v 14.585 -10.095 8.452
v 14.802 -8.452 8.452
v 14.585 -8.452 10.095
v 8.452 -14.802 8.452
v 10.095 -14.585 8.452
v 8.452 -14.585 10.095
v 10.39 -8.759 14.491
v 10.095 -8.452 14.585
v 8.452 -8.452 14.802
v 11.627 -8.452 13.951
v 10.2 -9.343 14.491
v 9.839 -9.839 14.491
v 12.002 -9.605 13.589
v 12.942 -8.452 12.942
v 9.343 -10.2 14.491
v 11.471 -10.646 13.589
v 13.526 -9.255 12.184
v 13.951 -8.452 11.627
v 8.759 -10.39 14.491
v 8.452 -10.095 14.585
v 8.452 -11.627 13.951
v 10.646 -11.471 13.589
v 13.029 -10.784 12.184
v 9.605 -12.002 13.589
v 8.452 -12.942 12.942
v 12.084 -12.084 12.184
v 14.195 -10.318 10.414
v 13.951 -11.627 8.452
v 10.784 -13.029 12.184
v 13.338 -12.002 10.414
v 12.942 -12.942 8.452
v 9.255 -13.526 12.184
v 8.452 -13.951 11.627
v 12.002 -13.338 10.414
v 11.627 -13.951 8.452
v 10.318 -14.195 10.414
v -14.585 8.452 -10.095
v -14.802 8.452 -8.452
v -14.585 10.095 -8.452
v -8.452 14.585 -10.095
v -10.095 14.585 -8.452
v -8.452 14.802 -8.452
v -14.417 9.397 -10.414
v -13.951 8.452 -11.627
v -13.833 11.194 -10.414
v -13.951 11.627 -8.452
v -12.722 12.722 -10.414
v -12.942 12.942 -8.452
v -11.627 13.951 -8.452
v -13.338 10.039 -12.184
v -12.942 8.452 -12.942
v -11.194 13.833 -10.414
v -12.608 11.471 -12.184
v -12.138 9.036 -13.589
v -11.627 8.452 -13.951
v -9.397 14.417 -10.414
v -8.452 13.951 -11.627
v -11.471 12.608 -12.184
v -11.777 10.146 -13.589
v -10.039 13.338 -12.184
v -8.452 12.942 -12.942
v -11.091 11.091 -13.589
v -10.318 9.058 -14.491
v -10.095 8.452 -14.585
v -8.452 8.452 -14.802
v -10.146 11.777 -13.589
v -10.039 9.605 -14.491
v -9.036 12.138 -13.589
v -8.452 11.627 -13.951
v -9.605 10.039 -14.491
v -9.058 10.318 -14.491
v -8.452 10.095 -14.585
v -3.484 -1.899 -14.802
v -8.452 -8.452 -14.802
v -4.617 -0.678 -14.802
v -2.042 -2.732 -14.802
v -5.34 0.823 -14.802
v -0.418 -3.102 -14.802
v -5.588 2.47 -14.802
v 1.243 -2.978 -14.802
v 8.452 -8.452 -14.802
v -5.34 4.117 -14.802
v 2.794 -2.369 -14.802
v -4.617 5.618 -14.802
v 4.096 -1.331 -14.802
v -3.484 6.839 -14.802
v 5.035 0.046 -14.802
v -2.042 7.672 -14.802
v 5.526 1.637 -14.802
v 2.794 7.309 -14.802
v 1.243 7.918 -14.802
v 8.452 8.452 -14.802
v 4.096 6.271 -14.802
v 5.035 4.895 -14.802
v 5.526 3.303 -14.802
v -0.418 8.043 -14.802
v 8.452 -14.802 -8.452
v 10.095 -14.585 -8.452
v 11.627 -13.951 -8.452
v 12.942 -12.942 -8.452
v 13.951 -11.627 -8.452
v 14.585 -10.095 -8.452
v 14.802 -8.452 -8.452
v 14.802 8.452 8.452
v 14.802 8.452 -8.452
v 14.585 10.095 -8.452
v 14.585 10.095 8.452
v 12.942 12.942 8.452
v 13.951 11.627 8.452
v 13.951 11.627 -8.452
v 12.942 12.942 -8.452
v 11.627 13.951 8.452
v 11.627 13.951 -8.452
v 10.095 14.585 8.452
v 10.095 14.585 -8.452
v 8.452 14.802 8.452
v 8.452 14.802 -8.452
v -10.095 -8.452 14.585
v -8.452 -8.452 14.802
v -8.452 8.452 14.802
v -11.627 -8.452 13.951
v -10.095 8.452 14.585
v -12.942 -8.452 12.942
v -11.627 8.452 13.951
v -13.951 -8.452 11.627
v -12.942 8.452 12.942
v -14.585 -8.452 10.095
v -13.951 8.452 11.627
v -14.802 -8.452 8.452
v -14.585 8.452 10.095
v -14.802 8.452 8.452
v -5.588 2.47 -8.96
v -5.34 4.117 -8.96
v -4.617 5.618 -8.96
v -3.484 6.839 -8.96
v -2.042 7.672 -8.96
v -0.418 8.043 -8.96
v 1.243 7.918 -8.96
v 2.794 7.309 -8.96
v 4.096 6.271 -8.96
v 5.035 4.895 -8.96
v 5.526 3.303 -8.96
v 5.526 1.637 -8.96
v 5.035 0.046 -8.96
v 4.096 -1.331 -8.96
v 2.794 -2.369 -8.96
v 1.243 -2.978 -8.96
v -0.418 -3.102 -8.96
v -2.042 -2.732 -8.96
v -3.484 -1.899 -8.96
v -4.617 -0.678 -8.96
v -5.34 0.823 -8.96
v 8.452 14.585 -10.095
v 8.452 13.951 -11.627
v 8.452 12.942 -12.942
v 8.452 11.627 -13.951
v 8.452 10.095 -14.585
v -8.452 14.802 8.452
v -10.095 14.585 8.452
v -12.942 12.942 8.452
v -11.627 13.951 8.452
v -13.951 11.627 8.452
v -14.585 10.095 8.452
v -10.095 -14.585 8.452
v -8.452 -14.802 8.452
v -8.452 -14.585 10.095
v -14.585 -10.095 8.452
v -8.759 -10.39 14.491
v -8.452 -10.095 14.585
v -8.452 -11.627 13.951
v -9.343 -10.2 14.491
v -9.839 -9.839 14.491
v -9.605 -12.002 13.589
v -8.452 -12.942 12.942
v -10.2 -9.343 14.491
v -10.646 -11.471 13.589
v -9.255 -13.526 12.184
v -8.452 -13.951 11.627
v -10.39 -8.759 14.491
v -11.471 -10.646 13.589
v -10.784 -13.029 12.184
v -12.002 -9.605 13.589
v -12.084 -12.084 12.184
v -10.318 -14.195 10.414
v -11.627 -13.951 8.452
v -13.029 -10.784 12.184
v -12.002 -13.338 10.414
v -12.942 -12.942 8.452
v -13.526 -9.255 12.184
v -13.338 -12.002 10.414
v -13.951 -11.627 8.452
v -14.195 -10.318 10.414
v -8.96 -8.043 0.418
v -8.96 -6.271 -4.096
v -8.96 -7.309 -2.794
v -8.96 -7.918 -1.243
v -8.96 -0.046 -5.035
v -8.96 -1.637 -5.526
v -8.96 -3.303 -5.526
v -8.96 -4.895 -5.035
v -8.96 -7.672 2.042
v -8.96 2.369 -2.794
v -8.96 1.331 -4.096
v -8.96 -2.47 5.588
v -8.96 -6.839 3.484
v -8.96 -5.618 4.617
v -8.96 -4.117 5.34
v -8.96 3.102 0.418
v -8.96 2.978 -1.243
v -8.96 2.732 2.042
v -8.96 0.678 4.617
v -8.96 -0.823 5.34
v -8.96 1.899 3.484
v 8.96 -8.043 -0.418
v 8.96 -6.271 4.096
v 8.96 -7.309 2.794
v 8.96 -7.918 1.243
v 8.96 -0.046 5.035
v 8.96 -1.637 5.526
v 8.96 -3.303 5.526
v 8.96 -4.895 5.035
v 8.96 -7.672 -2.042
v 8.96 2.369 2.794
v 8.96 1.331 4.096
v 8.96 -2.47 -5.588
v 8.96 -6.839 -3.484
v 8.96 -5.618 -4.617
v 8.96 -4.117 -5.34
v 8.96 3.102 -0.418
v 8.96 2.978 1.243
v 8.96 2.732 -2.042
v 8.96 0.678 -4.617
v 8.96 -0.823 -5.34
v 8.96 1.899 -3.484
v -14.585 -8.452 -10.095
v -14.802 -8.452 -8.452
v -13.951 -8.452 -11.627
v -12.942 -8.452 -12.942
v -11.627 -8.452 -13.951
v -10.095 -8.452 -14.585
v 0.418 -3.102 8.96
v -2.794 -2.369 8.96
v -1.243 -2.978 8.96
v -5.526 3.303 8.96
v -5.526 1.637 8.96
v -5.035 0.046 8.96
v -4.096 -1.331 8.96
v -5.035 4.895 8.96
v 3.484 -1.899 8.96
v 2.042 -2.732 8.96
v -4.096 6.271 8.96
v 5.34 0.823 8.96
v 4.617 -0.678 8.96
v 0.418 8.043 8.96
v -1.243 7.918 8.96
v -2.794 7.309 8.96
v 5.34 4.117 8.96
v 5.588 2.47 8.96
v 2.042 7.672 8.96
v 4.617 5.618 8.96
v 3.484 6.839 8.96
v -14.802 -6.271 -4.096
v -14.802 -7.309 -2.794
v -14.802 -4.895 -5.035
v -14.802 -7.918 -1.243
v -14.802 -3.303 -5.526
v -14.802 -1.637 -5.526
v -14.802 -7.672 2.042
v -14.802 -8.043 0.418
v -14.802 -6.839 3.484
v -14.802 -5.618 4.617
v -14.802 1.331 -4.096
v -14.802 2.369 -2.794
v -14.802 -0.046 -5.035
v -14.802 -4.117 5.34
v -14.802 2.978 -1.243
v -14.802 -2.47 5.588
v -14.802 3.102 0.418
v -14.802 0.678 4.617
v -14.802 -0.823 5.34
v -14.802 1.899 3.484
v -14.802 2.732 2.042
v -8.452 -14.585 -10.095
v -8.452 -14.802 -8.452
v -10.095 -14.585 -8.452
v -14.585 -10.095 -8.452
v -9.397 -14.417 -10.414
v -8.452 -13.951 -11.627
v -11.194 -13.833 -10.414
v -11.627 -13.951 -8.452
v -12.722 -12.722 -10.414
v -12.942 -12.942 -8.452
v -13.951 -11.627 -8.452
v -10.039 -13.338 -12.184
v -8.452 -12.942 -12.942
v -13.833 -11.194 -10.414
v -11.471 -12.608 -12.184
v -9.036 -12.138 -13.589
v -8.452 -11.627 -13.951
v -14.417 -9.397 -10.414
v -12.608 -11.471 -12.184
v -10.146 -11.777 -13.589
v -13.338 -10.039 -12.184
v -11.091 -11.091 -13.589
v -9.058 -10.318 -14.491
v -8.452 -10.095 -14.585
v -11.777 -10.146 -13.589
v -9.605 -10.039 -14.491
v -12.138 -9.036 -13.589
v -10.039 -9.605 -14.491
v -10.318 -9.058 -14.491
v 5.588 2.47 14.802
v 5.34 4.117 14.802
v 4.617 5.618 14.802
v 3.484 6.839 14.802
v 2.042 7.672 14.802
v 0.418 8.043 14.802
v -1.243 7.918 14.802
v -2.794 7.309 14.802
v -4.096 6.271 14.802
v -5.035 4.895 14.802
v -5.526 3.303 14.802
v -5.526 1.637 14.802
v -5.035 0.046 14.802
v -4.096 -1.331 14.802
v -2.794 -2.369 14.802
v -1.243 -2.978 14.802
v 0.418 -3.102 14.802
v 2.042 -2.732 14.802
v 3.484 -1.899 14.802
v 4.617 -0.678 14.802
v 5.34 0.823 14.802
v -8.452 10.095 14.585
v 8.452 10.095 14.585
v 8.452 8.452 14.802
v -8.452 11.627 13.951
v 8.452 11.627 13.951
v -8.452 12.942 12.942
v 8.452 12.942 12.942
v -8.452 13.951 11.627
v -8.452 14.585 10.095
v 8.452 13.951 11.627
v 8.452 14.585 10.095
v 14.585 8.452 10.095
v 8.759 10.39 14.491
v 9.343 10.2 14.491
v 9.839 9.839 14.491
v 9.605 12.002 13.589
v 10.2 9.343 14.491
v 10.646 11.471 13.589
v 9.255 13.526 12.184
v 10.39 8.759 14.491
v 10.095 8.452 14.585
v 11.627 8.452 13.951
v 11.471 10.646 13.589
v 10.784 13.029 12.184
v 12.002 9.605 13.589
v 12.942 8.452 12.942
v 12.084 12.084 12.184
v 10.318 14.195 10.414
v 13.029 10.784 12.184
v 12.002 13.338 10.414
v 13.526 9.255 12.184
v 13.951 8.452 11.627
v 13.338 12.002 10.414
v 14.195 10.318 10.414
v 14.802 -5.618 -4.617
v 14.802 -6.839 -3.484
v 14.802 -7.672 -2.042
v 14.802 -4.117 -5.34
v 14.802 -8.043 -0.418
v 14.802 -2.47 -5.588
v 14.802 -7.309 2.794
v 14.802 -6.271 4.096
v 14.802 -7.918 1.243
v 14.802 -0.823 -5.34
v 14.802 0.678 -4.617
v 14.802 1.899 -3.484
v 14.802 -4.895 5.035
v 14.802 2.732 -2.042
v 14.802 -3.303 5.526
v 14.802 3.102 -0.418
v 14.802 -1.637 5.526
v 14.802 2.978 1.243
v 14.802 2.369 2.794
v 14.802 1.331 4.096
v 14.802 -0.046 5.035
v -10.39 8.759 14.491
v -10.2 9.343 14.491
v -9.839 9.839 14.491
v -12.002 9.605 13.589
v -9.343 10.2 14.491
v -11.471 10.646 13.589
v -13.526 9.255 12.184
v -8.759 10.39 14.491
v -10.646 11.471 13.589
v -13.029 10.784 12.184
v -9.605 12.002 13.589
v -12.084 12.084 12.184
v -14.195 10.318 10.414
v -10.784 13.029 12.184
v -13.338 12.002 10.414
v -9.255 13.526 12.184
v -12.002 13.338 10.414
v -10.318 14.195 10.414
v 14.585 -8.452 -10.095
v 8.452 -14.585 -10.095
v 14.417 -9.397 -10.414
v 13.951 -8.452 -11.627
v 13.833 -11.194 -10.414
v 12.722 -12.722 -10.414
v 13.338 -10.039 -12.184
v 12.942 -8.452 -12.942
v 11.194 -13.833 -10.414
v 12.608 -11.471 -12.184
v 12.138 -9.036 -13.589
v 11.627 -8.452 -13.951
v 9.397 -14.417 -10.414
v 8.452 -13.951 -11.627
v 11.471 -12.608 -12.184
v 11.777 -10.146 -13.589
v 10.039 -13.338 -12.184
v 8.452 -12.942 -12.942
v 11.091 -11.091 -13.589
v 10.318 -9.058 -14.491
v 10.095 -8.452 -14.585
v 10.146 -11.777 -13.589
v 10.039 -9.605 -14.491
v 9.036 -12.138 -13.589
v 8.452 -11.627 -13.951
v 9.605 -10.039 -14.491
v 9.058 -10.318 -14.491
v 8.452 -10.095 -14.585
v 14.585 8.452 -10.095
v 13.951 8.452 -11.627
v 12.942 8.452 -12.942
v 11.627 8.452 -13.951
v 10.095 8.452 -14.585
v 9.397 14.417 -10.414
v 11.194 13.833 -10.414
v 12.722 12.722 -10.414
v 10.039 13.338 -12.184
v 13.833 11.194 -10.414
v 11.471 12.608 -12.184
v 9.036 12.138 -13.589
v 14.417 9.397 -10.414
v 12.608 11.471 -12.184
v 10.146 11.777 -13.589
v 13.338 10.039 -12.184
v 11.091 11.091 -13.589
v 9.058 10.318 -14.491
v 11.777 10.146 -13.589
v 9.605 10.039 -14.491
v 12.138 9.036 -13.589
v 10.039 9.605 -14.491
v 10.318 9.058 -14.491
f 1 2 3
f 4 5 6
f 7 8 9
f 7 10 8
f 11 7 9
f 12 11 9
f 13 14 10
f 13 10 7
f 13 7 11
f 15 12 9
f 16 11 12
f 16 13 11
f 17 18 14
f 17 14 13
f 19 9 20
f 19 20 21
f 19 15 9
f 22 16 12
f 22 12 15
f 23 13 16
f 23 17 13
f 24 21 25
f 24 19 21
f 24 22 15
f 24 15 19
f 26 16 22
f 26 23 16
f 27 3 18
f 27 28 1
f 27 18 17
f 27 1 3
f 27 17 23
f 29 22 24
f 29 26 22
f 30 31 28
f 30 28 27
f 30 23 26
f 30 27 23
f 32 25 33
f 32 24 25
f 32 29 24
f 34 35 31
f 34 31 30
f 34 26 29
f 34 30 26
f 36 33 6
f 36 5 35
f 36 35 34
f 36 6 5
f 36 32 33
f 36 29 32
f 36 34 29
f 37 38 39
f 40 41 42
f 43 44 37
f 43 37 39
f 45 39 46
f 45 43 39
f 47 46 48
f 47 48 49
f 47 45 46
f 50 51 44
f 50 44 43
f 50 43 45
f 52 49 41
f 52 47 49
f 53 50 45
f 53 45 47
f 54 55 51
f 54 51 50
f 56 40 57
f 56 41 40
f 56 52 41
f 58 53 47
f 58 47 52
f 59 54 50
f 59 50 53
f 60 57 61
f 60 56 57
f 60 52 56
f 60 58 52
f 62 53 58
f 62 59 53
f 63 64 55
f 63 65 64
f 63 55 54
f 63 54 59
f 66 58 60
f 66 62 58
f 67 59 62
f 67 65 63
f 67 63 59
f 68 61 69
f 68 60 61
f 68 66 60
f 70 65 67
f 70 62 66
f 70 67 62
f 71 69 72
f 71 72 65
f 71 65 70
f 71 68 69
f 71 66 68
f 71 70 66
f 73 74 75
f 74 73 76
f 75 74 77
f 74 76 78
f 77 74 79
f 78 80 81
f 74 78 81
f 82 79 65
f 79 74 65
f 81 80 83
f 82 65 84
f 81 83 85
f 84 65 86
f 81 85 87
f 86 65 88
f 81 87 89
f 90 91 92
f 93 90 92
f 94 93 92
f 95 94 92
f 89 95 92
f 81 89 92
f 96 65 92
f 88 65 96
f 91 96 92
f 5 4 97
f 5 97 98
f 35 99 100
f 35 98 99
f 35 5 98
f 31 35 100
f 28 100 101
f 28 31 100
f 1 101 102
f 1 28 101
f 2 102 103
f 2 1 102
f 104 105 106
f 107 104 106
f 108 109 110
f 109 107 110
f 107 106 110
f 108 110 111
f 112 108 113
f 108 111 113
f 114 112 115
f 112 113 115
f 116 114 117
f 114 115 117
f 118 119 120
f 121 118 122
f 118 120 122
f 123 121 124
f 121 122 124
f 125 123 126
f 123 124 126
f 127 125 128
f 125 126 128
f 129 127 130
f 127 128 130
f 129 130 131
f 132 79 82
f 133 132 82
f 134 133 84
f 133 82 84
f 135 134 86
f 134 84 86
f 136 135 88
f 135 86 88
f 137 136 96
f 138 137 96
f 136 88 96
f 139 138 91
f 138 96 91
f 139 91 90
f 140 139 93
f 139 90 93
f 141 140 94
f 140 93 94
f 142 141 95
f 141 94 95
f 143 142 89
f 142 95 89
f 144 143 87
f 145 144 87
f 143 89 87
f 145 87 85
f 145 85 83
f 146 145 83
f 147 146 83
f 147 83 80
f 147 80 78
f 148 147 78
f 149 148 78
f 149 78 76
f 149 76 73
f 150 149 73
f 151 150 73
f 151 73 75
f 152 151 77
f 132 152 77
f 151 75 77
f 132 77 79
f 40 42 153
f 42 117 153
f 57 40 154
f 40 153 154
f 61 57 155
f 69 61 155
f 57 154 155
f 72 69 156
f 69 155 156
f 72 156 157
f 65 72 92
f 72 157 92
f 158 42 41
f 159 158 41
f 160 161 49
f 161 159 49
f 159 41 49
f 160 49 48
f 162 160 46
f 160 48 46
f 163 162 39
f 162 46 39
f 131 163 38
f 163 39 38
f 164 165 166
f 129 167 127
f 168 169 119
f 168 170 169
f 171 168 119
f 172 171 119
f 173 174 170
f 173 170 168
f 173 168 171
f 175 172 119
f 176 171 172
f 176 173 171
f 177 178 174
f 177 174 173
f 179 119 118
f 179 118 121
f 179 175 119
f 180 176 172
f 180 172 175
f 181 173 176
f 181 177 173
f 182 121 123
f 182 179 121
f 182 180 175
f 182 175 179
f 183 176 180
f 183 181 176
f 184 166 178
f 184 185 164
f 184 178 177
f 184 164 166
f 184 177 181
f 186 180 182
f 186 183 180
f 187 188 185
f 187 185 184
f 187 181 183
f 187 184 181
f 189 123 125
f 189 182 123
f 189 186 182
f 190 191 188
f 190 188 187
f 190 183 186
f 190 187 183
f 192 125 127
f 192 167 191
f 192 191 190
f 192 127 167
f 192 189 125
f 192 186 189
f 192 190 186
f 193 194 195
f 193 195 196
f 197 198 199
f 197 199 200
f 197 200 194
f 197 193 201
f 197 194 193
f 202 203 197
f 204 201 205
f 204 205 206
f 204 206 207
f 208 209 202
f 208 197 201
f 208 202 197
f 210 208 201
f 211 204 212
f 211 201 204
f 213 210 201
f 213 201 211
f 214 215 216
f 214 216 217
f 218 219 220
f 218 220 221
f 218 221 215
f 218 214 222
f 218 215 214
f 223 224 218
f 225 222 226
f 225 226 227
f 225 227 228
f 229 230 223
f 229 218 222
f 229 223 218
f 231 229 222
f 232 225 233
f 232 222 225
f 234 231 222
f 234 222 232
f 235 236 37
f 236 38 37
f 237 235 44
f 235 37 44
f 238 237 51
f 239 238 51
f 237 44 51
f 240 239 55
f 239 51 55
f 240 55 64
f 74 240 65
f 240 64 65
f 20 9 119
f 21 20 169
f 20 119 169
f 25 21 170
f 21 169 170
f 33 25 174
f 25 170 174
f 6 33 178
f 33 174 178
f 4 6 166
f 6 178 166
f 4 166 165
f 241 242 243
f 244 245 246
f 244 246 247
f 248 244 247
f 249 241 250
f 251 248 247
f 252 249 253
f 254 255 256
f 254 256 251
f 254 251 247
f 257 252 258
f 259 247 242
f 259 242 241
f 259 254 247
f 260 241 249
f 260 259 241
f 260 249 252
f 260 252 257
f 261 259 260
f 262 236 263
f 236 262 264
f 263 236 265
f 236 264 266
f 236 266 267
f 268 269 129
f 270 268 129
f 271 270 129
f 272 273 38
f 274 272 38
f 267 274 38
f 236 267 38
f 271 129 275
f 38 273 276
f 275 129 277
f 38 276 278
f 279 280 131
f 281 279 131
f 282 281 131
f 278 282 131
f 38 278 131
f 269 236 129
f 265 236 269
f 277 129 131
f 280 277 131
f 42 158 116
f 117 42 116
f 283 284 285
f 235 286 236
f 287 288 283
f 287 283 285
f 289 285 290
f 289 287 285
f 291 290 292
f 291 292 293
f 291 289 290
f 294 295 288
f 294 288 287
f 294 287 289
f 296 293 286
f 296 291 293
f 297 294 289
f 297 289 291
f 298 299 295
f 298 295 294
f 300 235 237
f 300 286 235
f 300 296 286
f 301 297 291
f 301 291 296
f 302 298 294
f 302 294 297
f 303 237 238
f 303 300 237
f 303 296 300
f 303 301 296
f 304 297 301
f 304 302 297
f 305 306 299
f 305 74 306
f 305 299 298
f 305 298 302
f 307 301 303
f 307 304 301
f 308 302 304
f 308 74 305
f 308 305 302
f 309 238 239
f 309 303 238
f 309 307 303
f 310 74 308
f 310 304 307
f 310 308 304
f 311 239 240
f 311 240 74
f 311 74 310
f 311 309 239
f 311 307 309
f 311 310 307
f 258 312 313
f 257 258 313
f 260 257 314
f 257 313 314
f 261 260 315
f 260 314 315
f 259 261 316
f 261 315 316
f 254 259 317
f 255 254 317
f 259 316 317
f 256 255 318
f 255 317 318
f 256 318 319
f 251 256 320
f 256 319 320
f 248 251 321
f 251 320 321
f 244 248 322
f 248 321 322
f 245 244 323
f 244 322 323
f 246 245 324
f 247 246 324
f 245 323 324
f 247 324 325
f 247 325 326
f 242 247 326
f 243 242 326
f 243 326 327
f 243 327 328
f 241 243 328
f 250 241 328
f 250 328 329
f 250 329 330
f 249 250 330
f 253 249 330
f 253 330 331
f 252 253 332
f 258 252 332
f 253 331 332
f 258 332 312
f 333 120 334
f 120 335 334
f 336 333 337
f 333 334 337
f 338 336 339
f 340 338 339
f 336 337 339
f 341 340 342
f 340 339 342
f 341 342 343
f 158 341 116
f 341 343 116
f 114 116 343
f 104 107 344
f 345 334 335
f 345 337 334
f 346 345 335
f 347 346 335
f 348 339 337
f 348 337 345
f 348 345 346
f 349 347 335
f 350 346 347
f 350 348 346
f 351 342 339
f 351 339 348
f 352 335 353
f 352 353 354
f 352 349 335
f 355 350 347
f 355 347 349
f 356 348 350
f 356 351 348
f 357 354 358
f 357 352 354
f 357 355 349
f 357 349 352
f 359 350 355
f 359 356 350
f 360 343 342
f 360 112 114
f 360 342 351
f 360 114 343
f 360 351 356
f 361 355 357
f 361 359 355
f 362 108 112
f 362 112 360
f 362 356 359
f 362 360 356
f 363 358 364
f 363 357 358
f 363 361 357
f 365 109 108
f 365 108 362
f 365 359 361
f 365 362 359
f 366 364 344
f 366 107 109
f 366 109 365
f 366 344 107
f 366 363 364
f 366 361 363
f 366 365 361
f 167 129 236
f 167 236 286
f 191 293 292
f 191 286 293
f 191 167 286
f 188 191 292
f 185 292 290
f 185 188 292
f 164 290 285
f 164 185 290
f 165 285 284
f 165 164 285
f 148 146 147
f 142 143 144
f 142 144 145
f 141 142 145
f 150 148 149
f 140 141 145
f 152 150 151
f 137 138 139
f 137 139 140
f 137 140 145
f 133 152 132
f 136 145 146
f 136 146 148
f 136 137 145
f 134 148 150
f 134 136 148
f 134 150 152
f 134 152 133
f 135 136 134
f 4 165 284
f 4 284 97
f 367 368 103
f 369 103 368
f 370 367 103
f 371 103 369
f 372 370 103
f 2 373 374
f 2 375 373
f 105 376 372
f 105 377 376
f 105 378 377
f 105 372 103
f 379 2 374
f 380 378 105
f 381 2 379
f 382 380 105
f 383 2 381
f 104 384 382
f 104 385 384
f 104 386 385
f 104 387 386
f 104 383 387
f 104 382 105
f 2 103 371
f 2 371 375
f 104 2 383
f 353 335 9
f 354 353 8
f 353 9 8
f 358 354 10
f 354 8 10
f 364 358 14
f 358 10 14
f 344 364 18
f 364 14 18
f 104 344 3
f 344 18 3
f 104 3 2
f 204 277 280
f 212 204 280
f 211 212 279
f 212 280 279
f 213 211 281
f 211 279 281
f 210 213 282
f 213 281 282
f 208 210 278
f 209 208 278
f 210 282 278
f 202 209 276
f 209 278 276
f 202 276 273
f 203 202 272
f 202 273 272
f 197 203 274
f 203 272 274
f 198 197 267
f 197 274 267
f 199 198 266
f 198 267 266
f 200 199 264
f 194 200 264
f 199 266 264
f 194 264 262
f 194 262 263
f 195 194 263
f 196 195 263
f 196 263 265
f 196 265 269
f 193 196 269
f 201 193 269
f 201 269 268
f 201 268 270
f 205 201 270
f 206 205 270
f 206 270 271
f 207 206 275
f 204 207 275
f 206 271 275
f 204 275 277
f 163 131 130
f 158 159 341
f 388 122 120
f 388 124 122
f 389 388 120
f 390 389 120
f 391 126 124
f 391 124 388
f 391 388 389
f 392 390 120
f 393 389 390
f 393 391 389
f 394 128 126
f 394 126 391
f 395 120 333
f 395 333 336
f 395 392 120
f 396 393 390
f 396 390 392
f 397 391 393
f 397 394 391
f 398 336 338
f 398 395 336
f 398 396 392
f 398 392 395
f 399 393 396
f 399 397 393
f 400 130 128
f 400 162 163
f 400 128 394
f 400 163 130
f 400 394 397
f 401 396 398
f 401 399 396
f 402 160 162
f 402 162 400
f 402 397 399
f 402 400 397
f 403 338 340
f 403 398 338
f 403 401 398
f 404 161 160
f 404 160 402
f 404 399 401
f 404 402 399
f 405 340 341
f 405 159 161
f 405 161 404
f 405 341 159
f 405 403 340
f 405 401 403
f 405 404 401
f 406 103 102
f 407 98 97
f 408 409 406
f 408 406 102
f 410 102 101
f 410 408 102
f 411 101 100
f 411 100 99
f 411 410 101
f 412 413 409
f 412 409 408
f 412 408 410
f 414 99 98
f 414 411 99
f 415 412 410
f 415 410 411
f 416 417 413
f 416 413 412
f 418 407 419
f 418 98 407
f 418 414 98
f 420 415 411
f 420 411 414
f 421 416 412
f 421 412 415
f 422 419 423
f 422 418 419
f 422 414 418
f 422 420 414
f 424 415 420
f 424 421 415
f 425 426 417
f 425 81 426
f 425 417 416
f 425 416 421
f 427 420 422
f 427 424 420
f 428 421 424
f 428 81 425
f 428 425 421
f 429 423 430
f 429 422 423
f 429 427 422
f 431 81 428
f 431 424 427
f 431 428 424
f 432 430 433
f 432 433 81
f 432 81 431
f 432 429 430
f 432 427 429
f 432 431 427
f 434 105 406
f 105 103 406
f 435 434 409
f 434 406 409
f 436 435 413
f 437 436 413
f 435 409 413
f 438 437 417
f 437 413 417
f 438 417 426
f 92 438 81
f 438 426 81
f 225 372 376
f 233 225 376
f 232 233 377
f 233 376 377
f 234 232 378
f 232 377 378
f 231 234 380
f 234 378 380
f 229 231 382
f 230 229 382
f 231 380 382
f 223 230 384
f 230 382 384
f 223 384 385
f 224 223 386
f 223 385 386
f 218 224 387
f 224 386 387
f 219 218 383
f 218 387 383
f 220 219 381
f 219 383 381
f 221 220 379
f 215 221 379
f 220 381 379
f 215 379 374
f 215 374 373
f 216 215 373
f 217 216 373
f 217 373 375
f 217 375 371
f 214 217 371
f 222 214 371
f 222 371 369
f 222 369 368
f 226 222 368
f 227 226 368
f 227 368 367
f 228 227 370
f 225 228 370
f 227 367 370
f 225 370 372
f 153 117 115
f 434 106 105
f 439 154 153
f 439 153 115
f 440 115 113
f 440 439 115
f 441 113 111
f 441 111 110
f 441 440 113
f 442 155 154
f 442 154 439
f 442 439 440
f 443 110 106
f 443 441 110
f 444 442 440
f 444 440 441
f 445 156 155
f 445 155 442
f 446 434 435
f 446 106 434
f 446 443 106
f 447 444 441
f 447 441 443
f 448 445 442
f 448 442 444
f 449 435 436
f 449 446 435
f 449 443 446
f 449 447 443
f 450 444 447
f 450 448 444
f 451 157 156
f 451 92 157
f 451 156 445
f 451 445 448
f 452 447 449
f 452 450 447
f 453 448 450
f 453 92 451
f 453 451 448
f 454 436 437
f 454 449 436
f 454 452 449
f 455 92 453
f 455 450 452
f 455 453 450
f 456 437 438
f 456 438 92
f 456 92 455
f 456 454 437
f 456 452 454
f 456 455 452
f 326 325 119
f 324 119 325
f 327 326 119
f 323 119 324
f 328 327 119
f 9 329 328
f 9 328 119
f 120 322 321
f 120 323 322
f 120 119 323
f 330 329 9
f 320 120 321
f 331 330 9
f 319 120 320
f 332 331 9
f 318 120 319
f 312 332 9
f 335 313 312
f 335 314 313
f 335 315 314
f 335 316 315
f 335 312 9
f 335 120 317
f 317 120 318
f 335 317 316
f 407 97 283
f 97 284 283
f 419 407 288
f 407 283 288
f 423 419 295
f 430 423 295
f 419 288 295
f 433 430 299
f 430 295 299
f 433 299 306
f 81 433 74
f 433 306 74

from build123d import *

# Parameters (mm, degrees)
BOSS_EXTRUDE1_DEPTH      = 14.80185
BOSS_EXTRUDE1_DEPTH_BACK = 14.80185
SKETCH1_W                = 29.6037
SKETCH1_H                = 29.6037
FILLET3_R                = 6.35
FILLET4_R                = 6.35
FILLET5_R                = 6.35
FILLET6_R                = 6.35
SKETCH7_R                = 5.588
CUT_EXTRUDE3_DEPTH       = 5.842
CUT_EXTRUDE4_START       = -5.842
SKETCH8_R                = 5.588
CUT_EXTRUDE4_DEPTH       = 5.842
SKETCH3_R                = 5.588
CUT_EXTRUDE5_DEPTH       = 5.842
CUT_EXTRUDE6_START       = -5.842
SKETCH9_R                = 5.588
CUT_EXTRUDE6_DEPTH       = 5.842
FILLET7_R                = 6.35
FILLET8_R                = 6.35


with BuildPart() as part:
    # Sketch1 → Boss-Extrude1 (new, two sides: drawn at the far end of the back side and taken through both)
    with BuildSketch(Plane.XY.offset(-BOSS_EXTRUDE1_DEPTH_BACK)):
        Rectangle(SKETCH1_W, SKETCH1_H)
    extrude(amount=BOSS_EXTRUDE1_DEPTH + BOSS_EXTRUDE1_DEPTH_BACK)

    # Fillet3
    fillet3_edges = [part.edges().sort_by_distance(p)[0] for p in [
        (14.80185, 14.80185, 0),
    ]]
    fillet(fillet3_edges, radius=FILLET3_R)

    # Fillet4
    fillet4_edges = [part.edges().sort_by_distance(p)[0] for p in [
        (-14.80185, 14.80185, 0),
    ]]
    fillet(fillet4_edges, radius=FILLET4_R)

    # Fillet5
    fillet5_edges = [part.edges().sort_by_distance(p)[0] for p in [
        (-14.80185, -14.80185, 0),
    ]]
    fillet(fillet5_edges, radius=FILLET5_R)

    # Fillet6
    fillet6_edges = [part.edges().sort_by_distance(p)[0] for p in [
        (14.80185, -14.80185, 0),
    ]]
    fillet(fillet6_edges, radius=FILLET6_R)

    # Sketch7 → Cut-Extrude3 (cut)
    with BuildSketch(Plane(origin=(0, 0, -14.80185), x_dir=(-1, 0, 0), z_dir=(0, 0, -1))):
        with Locations((0, 2.47015)):
            Circle(SKETCH7_R)
    extrude(amount=-CUT_EXTRUDE3_DEPTH, mode=Mode.SUBTRACT)

    # Sketch8 → Cut-Extrude4 (cut)
    with BuildSketch(Plane.XY.offset(14.80185).offset(CUT_EXTRUDE4_START)):
        with Locations((0, 2.47015)):
            Circle(SKETCH8_R)
    extrude(amount=CUT_EXTRUDE4_DEPTH, mode=Mode.SUBTRACT)

    # Sketch3 → Cut-Extrude5 (cut)
    with BuildSketch(Plane.ZY.offset(14.80185)):
        with Locations((0, -2.47015)):
            Circle(SKETCH3_R)
    extrude(amount=-CUT_EXTRUDE5_DEPTH, mode=Mode.SUBTRACT)

    # Sketch9 → Cut-Extrude6 (cut)
    with BuildSketch(Plane(origin=(14.80185, 0, 0), x_dir=(0, 0, -1), z_dir=(1, 0, 0)).offset(CUT_EXTRUDE6_START)):
        with Locations((0, -2.47015)):
            Circle(SKETCH9_R)
    extrude(amount=CUT_EXTRUDE6_DEPTH, mode=Mode.SUBTRACT)

    # Fillet7
    fillet7_edges = [part.edges().sort_by_distance(p)[0] for p in [
        (0, 14.80185, 14.80185),
    ]]
    fillet(fillet7_edges, radius=FILLET7_R)

    # Fillet8
    fillet8_edges = [part.edges().sort_by_distance(p)[0] for p in [
        (0, 14.80185, -14.80185),
    ]]
    fillet(fillet8_edges, radius=FILLET8_R)


solid = part.part
